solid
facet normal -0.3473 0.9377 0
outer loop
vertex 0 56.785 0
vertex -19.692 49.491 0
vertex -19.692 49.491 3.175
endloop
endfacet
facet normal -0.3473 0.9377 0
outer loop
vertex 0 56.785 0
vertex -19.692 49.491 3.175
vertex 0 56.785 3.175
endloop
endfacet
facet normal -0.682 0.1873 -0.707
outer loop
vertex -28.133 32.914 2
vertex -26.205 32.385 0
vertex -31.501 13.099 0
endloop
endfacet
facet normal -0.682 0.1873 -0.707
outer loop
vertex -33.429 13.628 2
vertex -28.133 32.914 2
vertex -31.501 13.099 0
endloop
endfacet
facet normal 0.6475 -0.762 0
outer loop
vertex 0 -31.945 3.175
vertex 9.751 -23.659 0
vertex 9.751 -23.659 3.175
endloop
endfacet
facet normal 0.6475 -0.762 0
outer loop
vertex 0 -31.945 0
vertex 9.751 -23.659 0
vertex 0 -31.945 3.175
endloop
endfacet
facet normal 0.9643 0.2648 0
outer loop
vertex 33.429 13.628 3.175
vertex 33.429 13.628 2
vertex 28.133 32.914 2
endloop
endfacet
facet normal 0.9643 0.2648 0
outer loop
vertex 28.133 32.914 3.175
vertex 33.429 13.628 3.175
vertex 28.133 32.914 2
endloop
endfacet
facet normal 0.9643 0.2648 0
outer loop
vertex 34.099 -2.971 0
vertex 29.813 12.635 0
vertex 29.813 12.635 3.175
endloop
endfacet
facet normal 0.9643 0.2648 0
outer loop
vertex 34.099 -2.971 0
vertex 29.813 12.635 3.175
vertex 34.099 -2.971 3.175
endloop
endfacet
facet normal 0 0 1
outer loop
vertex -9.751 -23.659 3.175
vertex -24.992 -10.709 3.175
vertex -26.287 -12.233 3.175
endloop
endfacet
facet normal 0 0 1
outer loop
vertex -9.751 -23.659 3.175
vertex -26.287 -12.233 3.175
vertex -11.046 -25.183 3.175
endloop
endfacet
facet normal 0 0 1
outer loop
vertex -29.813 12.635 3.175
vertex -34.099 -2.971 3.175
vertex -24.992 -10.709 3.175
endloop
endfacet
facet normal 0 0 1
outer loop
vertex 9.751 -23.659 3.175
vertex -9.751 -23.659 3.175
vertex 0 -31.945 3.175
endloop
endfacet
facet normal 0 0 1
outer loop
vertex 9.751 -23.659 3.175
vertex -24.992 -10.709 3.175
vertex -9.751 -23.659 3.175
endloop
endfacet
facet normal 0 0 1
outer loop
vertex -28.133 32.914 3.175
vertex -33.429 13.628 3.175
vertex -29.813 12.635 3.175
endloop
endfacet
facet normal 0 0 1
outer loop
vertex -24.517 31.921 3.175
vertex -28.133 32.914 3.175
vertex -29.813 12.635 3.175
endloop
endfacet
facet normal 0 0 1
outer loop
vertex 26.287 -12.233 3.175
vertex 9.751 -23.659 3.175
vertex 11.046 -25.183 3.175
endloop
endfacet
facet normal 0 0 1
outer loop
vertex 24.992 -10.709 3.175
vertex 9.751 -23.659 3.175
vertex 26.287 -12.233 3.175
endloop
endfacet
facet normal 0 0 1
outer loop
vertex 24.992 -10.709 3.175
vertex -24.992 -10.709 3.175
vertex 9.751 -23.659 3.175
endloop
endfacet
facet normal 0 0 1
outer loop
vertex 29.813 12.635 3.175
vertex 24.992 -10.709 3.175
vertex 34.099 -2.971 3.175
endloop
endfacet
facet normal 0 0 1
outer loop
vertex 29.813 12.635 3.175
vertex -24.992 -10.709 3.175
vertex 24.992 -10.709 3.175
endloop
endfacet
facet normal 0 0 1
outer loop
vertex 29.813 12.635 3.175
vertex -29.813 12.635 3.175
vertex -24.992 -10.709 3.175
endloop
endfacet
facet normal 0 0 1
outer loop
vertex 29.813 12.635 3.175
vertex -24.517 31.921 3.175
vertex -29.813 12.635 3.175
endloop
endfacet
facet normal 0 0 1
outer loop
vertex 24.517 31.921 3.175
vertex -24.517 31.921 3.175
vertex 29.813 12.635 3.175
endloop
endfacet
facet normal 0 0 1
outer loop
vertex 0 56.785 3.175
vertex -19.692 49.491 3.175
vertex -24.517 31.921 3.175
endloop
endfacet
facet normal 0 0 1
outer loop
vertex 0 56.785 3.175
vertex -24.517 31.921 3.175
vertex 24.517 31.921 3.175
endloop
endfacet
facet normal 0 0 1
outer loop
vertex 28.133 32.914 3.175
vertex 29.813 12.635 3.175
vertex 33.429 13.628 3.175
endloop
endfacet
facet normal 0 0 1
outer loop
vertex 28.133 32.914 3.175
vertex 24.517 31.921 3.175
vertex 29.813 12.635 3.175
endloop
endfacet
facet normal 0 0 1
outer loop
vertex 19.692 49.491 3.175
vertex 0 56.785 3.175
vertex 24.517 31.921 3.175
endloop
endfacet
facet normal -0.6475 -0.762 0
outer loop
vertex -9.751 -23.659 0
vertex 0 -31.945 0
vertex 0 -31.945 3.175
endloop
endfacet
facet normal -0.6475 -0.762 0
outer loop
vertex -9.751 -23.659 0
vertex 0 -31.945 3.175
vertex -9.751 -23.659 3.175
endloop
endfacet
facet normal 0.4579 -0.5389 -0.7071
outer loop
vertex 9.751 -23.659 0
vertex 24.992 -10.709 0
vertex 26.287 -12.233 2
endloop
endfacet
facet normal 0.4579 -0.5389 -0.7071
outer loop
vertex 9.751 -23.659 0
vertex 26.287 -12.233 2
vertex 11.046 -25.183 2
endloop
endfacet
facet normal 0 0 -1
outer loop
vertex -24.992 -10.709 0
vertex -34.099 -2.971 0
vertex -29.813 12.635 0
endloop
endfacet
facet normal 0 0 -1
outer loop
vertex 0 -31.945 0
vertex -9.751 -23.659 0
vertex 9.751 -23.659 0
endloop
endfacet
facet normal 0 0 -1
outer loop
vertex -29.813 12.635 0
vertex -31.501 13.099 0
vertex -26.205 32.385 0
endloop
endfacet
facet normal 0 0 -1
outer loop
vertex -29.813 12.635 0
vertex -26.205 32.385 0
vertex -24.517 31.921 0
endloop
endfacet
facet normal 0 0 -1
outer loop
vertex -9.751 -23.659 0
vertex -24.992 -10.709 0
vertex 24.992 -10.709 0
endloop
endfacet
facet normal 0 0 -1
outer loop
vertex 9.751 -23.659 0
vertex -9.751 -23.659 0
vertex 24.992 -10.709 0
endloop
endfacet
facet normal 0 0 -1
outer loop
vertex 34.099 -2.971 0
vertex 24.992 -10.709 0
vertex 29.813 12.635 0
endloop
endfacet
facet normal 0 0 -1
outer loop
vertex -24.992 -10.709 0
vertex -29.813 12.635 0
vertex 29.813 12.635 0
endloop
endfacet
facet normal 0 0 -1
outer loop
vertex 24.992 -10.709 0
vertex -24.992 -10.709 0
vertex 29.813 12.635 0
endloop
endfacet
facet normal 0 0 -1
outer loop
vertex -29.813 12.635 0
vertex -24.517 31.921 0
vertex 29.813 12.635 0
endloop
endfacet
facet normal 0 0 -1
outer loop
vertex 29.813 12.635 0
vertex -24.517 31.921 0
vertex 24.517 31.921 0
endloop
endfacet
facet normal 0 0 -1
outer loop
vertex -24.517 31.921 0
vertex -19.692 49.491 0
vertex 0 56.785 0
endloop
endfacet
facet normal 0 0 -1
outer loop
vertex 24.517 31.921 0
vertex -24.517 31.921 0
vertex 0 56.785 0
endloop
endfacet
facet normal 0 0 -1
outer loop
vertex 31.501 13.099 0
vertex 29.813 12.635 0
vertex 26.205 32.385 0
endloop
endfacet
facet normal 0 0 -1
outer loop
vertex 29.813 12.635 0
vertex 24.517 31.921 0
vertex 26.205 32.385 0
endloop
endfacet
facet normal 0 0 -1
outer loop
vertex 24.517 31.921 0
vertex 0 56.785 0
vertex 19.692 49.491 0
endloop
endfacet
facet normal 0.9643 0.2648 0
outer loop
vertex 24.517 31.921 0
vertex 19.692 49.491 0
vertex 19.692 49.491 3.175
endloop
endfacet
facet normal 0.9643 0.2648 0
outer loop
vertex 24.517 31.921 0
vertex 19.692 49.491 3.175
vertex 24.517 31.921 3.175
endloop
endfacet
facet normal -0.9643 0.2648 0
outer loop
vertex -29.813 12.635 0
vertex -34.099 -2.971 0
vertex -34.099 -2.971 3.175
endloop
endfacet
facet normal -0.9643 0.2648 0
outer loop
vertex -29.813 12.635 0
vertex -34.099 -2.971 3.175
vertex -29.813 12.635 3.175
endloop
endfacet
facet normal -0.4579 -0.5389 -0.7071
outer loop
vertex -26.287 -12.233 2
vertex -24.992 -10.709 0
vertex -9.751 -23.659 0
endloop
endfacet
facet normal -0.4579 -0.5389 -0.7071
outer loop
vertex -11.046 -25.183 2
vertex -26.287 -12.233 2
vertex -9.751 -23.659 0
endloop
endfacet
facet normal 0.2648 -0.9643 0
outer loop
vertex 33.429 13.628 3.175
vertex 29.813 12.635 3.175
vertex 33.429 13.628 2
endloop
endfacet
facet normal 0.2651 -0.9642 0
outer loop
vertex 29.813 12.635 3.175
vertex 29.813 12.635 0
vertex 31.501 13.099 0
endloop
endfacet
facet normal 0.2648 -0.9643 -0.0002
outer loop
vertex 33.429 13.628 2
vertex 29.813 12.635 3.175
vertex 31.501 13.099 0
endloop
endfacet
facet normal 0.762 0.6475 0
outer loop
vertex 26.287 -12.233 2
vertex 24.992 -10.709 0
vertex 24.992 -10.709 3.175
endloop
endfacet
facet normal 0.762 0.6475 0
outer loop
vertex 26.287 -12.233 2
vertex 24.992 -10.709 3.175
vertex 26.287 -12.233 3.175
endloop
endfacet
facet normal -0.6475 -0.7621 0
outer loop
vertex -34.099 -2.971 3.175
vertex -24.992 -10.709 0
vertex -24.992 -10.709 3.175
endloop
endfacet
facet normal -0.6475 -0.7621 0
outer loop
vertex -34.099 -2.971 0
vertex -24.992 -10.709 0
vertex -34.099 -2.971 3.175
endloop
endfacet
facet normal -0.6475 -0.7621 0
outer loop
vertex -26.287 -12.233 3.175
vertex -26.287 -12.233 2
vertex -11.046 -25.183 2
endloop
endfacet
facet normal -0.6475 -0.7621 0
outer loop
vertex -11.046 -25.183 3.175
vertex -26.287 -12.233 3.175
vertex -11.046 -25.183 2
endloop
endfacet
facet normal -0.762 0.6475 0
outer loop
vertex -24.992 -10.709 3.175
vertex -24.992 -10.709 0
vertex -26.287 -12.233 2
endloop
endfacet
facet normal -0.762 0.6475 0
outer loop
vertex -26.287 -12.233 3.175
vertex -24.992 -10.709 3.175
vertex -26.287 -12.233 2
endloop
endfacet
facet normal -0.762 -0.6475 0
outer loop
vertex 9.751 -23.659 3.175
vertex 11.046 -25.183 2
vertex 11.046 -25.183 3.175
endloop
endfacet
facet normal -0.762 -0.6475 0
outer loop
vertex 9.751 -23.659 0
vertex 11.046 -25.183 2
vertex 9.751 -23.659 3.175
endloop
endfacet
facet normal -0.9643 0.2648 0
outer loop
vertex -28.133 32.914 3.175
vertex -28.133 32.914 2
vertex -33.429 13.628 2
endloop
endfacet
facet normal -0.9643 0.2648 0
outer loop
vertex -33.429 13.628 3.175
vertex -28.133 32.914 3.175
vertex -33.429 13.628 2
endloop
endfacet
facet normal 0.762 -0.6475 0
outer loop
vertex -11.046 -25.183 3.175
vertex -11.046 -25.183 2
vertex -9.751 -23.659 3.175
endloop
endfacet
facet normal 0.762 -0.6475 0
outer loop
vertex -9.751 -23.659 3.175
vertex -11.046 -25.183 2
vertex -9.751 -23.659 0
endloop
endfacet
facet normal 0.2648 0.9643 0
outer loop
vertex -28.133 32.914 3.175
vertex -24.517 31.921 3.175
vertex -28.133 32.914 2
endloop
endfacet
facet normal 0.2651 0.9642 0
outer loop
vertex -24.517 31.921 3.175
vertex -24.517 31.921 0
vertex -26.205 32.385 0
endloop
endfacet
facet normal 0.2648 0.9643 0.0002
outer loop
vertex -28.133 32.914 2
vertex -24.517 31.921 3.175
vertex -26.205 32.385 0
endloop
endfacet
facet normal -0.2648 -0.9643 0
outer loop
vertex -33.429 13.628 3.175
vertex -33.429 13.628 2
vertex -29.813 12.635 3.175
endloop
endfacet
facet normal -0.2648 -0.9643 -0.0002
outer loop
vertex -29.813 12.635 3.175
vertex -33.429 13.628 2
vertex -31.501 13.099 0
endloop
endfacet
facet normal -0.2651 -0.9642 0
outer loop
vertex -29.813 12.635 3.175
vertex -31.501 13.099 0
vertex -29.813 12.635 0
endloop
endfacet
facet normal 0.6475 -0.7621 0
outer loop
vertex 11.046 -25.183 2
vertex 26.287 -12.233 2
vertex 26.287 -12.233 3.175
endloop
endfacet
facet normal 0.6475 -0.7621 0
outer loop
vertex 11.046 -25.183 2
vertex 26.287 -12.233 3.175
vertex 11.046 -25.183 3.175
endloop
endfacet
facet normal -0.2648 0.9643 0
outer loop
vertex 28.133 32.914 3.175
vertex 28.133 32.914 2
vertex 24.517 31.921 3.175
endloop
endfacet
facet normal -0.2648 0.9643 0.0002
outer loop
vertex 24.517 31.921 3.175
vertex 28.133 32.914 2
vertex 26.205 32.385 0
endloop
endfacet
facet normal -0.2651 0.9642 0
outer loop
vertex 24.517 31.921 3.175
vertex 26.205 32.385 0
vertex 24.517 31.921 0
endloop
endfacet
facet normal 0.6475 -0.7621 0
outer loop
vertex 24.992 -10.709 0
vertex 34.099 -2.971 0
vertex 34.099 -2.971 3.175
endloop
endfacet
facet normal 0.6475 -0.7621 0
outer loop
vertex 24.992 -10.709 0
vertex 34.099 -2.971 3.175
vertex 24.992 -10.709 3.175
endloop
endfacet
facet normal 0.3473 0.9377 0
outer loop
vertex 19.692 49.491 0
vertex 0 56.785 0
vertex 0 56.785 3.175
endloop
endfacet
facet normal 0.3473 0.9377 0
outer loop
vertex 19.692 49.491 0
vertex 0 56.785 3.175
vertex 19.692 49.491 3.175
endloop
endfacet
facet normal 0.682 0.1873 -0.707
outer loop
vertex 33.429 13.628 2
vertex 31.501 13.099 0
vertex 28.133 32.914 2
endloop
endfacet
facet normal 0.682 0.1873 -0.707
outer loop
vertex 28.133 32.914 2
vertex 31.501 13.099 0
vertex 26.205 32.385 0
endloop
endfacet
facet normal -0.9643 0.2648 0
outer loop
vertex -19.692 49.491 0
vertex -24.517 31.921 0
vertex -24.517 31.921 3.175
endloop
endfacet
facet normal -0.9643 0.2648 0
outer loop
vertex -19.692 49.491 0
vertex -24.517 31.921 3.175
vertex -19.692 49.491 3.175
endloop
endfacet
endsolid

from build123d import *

# Parameters (mm, degrees)
BOSS_EXTRUDE1_DEPTH = 3.175
CHAMFER1_SIZE       = 2


with BuildPart() as part:
    # Sketch1 → Boss-Extrude1 (new body)
    with BuildSketch(Plane.XY):
        Polygon((-29.813098334, 12.635256228), (-24.517121596, 31.921329711), (-28.133260375, 32.914325349), (-33.429237113, 13.628251866), align=None)
        Polygon((0, 56.785184499), (0, -31.944815501), (-34.098545596, -2.970826443), (-19.692486788, 49.490942654), align=None)
        Polygon((0, 56.785184499), (19.692486788, 49.490942654), (34.098545596, -2.970826443), (0, -31.944815501), align=None)
        Polygon((28.133260375, 32.914325349), (24.517121596, 31.921329711), (29.813098334, 12.635256228), (33.429237113, 13.628251866), align=None)
        Polygon((-11.046183779, -25.183235467), (-9.751140598, -23.659141257), (-24.992082694, -10.708709448), (-26.287125875, -12.232803658), align=None)
        Polygon((26.287125875, -12.232803658), (11.046183779, -25.183235467), (9.751140598, -23.659141257), (24.992082694, -10.708709448), align=None)
    extrude(amount=BOSS_EXTRUDE1_DEPTH)

    # Chamfer1
    chamfer1_edges = [part.edges().sort_by_distance(p)[0] for p in [
        (18.666654827, -18.708019562, 0),
        (-18.666654827, -18.708019562, 0),
        (-30.781248744, 23.271288608, 0),
        (30.781248744, 23.271288608, 0),
    ]]
    chamfer(chamfer1_edges, length=CHAMFER1_SIZE)


solid = part.part
